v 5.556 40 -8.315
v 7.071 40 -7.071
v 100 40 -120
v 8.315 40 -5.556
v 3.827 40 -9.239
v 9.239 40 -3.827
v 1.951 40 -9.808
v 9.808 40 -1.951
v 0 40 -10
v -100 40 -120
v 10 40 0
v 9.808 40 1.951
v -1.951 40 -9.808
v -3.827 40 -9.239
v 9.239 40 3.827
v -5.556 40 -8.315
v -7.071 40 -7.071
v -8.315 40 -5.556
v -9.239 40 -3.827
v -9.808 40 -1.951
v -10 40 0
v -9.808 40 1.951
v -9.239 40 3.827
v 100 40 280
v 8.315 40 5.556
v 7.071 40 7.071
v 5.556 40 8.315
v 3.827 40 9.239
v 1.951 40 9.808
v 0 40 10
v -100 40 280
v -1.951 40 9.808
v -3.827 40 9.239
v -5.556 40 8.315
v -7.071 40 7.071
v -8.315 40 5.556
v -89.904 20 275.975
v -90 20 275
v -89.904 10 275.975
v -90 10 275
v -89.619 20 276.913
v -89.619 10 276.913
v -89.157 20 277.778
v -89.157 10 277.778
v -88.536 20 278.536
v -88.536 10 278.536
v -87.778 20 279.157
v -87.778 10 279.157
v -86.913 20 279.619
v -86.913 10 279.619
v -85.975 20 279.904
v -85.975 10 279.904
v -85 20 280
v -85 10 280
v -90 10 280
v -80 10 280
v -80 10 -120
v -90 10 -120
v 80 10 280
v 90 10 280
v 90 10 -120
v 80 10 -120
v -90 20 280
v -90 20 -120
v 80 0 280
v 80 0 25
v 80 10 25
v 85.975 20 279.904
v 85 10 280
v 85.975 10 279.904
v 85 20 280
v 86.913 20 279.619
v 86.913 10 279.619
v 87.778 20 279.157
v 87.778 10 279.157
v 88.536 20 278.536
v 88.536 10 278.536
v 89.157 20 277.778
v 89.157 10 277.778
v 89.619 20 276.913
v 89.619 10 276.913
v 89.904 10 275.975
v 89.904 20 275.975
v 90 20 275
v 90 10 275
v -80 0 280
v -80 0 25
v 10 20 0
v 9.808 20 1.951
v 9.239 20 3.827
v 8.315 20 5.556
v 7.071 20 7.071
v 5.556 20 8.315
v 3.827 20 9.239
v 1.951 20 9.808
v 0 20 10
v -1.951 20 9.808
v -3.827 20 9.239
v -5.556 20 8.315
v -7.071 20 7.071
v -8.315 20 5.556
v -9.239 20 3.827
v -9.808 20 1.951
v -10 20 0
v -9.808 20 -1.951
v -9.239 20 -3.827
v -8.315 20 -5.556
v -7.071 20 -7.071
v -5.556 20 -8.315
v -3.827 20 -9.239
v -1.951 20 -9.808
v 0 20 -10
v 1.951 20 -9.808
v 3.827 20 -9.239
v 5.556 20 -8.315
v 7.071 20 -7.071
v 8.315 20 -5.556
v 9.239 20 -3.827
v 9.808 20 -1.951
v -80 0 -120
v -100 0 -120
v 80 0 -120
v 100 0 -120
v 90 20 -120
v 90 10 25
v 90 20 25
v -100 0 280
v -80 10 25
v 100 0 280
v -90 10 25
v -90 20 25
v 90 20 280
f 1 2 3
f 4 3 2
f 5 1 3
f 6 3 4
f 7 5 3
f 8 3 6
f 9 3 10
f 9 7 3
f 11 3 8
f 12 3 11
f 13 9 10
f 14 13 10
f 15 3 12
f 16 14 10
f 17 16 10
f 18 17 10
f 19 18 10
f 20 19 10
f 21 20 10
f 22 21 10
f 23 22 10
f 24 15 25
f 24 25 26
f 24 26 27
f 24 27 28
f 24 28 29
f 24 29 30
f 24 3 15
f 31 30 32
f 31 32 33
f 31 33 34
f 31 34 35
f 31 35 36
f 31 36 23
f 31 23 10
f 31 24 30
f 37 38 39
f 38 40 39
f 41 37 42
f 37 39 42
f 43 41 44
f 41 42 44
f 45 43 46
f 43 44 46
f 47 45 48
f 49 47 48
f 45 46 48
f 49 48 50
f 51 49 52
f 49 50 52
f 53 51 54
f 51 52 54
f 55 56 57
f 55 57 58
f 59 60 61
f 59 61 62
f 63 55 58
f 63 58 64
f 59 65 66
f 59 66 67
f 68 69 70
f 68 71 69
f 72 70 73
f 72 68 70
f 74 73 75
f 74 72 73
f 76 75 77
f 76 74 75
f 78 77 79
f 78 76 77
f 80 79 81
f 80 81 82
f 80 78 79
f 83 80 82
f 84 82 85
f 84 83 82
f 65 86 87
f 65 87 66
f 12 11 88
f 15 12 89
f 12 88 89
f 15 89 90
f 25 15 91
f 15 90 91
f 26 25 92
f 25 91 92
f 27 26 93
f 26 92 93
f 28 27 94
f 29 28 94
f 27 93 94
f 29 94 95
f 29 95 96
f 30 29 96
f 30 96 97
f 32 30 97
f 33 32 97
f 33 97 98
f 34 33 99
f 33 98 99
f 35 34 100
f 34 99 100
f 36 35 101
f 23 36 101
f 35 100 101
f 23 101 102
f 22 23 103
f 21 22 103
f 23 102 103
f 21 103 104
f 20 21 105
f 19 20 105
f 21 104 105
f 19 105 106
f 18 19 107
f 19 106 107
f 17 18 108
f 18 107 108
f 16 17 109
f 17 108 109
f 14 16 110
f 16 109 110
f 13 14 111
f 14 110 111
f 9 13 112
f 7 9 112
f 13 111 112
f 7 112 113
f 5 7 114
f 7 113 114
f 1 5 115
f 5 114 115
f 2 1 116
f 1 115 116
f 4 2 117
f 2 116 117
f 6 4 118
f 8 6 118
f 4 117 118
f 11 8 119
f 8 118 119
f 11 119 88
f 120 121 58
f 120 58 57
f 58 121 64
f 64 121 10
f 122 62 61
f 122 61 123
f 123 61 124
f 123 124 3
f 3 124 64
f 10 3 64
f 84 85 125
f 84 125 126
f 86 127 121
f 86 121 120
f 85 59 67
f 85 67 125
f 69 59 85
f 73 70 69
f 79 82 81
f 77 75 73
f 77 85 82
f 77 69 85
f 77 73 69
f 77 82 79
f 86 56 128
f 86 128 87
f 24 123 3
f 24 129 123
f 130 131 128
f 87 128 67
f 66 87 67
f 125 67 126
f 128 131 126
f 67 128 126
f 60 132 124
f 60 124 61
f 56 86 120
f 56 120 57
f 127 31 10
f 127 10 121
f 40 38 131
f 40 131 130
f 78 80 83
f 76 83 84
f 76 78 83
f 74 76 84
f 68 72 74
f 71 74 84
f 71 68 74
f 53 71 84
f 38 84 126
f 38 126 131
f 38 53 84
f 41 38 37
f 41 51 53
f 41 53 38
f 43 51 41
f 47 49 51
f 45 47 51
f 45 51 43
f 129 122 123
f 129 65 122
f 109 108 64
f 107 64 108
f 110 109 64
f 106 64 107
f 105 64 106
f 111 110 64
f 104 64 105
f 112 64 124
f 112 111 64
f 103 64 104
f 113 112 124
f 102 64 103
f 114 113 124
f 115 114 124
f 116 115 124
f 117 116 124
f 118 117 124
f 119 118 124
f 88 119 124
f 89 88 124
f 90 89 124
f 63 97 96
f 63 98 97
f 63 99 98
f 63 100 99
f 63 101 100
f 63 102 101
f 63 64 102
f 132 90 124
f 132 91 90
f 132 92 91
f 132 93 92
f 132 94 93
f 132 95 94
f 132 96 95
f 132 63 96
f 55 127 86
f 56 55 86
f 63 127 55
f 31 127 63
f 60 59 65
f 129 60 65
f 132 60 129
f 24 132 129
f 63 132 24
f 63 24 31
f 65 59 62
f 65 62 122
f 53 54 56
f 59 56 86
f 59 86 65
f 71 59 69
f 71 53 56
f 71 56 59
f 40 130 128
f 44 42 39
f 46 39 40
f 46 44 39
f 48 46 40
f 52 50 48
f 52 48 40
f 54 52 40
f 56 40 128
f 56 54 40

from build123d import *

# Parameters (mm, degrees)
F1_DEPTH      = 280
F1_DEPTH_BACK = 120
F2_R          = 10
F3_DEPTH      = 20
F5_DEPTH      = 255
F6_R          = 5
F7_R          = 5


with BuildPart() as f1:
    # F0 (on Top) → F1 (new body, two sides)
    with BuildSketch(Plane.XY) as f1_sk:
        Polygon((100, 40), (0, 40), (-100, 40), (-100, 0), (-80, 0), (-80, 10), (-90, 10), (-90, 20), (0, 20), (90, 20), (90, 10), (80, 10), (80, 0), (100, 0), align=None)
    extrude(amount=F1_DEPTH)
    extrude(f1_sk.sketch, amount=-F1_DEPTH_BACK)

    # F2 (on face) → F3 (cut)
    with BuildSketch(Plane.XZ.offset(-20)):
        Circle(F2_R)
    extrude(amount=-F3_DEPTH, mode=Mode.SUBTRACT)


with BuildPart() as f5:
    # F4 (on face) → F5 (new body)
    with BuildSketch(Plane.XY.offset(280)):
        Polygon((90, 20), (-90, 20), (-90, 10), (-80, 10), (-80, 0), (80, 0), (80, 10), (90, 10), align=None)
    extrude(amount=-F5_DEPTH)

    # F6
    f6_edges = [f5.edges().sort_by_distance(p)[0] for p in [
        (-90, 15, 280),
    ]]
    fillet(f6_edges, radius=F6_R)

    # F7
    f7_edges = [f5.edges().sort_by_distance(p)[0] for p in [
        (90, 15, 280),
    ]]
    fillet(f7_edges, radius=F7_R)


solid = Compound([f1.part, f5.part])
